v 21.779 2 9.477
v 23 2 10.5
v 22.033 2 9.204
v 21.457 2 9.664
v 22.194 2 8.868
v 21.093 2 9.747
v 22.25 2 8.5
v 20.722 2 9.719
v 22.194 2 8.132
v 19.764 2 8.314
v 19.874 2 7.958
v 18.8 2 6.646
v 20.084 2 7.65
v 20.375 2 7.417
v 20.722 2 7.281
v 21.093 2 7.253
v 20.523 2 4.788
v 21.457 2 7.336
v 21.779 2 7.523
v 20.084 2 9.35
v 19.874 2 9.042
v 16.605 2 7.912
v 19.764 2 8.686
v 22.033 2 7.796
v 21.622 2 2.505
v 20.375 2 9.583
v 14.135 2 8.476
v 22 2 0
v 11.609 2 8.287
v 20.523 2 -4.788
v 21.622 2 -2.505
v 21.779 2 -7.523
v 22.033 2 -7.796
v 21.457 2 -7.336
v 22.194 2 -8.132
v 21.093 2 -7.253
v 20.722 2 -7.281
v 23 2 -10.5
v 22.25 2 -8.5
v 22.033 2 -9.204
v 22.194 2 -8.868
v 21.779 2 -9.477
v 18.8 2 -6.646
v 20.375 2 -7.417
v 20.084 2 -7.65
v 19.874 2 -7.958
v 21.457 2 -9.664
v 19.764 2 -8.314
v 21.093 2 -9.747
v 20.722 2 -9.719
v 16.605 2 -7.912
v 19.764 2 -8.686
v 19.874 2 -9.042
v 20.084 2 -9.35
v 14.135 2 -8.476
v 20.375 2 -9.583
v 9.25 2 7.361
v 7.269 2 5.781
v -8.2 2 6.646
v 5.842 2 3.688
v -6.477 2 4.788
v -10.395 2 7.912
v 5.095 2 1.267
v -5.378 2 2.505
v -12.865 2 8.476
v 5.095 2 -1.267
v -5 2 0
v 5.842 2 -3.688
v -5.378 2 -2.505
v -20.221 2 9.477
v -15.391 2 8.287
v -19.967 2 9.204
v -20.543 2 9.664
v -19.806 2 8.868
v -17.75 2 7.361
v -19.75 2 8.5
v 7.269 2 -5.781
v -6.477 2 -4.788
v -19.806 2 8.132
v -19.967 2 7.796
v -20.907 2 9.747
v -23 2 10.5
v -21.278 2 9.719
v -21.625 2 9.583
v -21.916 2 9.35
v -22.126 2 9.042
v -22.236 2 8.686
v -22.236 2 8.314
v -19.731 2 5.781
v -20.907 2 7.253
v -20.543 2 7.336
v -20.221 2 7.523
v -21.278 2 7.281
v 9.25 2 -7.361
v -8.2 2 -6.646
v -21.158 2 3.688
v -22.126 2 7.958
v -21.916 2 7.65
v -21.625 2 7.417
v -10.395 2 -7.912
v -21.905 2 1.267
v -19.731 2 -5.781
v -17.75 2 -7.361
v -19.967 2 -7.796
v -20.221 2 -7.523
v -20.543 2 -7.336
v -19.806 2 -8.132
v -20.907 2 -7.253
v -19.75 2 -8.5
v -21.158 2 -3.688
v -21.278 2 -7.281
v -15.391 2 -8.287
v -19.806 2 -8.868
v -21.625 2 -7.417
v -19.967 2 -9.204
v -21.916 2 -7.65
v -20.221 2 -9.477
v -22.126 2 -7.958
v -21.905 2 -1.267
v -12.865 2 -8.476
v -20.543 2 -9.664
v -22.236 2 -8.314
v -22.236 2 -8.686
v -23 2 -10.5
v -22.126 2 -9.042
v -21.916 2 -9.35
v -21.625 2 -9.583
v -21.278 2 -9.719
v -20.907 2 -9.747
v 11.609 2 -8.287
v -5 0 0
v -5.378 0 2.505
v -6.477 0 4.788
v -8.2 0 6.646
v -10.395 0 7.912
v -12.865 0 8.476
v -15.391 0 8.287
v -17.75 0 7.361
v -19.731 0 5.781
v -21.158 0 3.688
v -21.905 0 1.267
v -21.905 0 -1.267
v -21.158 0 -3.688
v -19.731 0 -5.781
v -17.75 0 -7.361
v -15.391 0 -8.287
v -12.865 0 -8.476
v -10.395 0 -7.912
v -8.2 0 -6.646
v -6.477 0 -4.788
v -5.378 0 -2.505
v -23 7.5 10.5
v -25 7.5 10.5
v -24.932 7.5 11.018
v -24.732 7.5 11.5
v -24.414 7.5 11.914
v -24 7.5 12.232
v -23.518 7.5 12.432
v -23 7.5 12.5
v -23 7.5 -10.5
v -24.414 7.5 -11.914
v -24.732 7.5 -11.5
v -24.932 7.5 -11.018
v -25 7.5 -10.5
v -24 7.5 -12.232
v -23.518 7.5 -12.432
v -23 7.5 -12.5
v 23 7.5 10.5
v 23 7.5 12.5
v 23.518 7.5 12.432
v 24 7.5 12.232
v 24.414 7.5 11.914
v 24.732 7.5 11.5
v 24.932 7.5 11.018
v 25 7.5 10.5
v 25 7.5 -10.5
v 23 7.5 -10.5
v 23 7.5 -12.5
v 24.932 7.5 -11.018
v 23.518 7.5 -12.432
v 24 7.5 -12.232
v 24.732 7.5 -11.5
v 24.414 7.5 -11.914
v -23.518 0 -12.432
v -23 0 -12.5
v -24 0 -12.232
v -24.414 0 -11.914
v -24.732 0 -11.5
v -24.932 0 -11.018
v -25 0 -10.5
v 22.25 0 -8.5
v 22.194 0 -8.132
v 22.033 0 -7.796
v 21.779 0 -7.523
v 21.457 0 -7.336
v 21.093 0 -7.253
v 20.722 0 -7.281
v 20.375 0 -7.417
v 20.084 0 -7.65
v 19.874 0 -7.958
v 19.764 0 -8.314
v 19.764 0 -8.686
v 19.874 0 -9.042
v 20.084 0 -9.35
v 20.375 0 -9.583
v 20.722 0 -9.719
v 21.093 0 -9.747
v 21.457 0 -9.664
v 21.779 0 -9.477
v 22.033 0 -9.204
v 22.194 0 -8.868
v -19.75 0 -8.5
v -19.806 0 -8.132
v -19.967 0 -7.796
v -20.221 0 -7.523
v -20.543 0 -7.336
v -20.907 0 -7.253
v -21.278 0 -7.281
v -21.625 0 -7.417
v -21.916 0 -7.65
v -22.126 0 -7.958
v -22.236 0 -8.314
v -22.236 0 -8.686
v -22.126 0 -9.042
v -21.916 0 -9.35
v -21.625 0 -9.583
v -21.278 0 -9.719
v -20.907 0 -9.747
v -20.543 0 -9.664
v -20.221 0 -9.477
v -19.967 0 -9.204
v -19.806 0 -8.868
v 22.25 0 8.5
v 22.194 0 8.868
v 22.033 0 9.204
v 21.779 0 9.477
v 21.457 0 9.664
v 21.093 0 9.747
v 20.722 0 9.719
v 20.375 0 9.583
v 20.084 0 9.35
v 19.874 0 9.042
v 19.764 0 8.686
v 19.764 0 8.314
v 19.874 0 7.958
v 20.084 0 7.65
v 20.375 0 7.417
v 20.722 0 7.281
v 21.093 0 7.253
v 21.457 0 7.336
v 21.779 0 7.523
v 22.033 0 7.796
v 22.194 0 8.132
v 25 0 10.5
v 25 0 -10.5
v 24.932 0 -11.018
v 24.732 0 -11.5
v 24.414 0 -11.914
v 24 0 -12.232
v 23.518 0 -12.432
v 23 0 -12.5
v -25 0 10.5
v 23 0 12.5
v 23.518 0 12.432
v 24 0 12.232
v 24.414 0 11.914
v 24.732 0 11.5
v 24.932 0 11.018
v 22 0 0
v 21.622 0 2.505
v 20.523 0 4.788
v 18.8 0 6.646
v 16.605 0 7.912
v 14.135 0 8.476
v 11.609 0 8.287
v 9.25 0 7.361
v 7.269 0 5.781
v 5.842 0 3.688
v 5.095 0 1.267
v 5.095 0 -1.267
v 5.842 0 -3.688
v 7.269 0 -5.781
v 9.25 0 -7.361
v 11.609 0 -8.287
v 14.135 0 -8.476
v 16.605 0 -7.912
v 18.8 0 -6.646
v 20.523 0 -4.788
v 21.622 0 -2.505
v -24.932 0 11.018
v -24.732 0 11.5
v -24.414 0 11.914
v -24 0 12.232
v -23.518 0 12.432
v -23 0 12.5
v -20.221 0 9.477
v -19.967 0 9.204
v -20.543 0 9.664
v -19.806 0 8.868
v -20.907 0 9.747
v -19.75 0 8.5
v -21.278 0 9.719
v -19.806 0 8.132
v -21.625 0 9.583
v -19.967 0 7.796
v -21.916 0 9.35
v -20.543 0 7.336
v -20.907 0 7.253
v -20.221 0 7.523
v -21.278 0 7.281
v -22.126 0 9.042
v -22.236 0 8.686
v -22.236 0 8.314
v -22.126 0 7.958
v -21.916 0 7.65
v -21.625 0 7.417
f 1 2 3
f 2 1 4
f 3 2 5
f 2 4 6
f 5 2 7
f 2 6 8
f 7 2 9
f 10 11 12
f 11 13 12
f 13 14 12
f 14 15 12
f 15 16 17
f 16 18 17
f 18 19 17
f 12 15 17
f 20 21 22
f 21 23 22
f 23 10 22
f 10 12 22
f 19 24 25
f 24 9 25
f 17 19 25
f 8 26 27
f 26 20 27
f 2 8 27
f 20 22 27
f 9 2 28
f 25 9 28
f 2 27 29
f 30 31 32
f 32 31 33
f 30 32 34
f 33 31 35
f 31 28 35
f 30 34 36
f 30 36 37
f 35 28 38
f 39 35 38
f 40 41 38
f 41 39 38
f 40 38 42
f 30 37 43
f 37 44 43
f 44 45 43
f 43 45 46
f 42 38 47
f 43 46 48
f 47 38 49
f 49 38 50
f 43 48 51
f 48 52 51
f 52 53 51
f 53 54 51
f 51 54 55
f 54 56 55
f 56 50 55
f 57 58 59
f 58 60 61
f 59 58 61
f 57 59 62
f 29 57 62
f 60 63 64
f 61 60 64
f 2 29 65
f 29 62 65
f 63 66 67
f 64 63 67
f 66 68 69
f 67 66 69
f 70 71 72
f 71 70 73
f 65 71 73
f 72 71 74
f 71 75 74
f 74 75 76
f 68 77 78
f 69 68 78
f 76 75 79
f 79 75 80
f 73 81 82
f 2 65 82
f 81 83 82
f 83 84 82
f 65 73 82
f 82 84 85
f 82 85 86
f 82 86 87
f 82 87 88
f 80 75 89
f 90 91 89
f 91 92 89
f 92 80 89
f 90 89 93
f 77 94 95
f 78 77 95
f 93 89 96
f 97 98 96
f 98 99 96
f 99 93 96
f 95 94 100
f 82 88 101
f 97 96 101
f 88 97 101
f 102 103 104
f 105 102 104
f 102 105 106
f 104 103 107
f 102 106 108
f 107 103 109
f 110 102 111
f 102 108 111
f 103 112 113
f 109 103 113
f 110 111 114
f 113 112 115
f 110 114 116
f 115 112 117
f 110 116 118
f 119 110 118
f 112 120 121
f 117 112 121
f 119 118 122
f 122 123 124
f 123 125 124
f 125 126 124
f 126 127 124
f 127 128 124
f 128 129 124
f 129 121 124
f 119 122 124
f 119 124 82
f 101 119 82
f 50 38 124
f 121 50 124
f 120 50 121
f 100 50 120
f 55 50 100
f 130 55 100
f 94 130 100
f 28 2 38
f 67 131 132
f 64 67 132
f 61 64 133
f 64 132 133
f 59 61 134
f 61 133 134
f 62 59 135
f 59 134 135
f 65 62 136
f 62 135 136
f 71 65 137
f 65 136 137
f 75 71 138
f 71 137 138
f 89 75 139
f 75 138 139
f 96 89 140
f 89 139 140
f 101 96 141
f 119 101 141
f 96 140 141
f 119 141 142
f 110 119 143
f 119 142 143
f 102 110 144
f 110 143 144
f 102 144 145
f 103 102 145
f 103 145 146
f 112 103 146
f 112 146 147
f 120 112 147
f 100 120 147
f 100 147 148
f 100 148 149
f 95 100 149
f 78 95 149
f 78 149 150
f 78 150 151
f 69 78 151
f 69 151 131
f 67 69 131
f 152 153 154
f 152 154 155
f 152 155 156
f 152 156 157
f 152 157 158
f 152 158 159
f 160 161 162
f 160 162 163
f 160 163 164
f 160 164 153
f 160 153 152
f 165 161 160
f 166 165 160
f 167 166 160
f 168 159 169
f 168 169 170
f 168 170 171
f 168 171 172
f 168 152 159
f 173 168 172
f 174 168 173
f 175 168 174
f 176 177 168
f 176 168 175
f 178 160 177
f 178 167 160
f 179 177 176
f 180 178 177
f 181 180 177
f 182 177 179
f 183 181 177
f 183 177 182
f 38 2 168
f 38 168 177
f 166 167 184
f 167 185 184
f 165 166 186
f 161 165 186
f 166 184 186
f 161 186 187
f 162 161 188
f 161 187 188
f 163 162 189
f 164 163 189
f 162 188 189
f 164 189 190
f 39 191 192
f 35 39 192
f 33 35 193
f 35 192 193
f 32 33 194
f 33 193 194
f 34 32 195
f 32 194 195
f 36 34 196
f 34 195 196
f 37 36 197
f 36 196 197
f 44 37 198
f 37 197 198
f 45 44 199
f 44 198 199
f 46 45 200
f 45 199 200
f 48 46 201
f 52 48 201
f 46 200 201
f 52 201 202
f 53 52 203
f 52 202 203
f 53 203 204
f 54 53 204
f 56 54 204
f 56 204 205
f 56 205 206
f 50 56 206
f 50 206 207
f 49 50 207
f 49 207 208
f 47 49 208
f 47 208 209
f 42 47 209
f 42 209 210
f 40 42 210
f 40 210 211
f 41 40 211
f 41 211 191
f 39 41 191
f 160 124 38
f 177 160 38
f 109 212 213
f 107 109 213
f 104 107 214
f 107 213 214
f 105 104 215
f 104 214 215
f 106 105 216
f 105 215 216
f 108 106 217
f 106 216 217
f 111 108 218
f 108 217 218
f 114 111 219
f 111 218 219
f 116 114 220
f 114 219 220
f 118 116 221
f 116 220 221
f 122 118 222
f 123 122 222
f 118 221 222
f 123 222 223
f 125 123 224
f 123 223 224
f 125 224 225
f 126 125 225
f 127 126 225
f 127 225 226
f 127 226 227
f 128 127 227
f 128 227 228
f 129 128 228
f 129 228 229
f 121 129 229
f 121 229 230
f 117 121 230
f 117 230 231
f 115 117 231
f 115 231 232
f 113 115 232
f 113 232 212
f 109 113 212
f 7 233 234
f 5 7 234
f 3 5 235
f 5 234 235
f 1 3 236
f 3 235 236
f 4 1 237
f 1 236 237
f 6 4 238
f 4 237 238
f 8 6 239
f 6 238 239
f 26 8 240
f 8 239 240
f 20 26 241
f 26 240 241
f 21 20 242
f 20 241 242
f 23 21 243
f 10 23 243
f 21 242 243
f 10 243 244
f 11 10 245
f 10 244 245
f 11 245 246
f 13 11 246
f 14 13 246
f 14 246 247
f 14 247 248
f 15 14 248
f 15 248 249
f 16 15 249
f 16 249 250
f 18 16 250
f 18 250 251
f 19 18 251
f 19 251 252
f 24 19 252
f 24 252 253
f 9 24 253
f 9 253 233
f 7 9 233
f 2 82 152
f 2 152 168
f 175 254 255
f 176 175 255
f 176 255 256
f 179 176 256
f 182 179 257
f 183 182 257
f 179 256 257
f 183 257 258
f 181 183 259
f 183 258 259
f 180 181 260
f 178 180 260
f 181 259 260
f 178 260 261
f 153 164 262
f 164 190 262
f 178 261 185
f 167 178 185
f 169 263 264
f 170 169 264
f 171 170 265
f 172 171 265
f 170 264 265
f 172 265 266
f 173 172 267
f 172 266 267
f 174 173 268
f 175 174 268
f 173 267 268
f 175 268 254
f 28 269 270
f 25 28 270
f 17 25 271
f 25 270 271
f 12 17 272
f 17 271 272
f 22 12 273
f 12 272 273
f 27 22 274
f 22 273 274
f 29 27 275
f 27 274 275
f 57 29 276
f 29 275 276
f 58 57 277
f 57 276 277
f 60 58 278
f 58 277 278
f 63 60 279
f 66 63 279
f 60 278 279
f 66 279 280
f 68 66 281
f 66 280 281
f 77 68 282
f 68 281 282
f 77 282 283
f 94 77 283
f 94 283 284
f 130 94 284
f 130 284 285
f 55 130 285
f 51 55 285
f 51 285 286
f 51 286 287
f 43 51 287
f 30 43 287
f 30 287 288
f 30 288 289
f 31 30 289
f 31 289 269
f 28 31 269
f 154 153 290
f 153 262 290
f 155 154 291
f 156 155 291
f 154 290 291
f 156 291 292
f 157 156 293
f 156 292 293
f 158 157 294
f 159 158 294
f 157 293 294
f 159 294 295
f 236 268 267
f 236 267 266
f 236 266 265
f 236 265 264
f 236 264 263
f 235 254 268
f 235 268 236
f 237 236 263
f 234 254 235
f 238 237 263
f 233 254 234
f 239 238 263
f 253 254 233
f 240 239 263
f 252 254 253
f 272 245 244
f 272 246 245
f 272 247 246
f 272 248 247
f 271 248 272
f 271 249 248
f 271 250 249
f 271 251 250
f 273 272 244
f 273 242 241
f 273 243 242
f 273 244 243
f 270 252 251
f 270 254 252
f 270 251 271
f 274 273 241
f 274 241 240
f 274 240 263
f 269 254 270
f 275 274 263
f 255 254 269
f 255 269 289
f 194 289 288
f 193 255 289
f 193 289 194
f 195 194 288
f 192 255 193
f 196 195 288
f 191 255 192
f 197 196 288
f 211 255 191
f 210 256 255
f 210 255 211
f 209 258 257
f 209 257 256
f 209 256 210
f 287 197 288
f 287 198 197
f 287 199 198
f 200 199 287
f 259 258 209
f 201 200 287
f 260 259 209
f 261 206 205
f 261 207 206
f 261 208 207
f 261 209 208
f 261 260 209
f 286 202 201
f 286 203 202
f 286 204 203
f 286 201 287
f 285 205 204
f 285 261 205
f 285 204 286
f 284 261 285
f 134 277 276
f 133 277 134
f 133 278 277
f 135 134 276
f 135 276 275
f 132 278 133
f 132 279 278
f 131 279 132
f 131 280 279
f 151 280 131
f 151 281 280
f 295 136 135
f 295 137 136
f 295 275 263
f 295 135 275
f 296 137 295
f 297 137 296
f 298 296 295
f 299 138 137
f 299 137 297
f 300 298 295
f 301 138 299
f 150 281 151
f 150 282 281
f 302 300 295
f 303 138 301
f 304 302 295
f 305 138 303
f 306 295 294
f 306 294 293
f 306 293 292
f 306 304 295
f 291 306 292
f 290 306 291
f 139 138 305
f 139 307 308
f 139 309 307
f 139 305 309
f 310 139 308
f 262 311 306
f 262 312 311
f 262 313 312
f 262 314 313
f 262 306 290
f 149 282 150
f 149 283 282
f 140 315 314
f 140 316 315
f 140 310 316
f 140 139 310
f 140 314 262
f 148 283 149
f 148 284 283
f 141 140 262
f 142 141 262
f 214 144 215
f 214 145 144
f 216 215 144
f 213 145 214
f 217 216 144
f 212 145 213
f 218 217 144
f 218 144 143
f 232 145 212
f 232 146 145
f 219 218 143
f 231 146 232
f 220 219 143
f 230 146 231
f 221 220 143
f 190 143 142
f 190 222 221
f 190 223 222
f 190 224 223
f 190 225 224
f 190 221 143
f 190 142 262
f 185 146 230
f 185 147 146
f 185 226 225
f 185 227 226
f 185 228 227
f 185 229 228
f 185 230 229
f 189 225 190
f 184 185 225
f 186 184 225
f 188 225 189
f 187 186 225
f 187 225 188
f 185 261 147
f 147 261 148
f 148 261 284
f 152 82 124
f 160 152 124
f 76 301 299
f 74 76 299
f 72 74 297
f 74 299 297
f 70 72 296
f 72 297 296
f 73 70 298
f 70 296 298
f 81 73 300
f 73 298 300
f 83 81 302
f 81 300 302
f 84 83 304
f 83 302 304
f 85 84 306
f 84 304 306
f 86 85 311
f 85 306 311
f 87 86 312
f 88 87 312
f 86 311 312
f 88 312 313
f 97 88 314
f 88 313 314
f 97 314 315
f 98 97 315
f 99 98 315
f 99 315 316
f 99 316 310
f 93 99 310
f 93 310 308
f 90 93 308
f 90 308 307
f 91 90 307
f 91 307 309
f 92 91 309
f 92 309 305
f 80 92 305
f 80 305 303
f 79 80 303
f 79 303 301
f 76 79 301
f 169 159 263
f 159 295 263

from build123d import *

# Parameters (mm, degrees)
EXTRUDE_1_DEPTH     = 2
SKETCH_2_W          = 46
SKETCH_2_H          = 21
EXTRUDE_2_DEPTH     = 5.5
SKETCH_3_R          = 1.25
CUT_EXTRUDE_1_DEPTH = 8.5
SKETCH_4_R          = 8.5
CUT_EXTRUDE_2_DEPTH = 8.5


with BuildPart() as part:
    # 草图1 → 凸台-拉伸1 (new body)
    with BuildSketch(Plane(origin=(0, 0, 0), x_dir=(1, 0, 0), z_dir=(0, 1, 0))):
        with BuildLine():
            Line((-23, 12.5), (23, 12.5))
            ThreePointArc((23, 12.5), (24.414213562, 11.914213562), (25, 10.5))
            Line((25, 10.5), (25, -10.5))
            ThreePointArc((25, -10.5), (24.414213562, -11.914213562), (23, -12.5))
            Line((23, -12.5), (-23, -12.5))
            ThreePointArc((-23, -12.5), (-24.414213562, -11.914213562), (-25, -10.5))
            Line((-25, -10.5), (-25, 10.5))
            ThreePointArc((-25, 10.5), (-24.414213562, 11.914213562), (-23, 12.5))
        make_face()
    extrude(amount=EXTRUDE_1_DEPTH)

    # 草图2 → 凸台-拉伸2 (add)
    with BuildSketch(Plane(origin=(0, 2, 0), x_dir=(1, 0, 0), z_dir=(0, 1, 0))):
        with BuildLine():
            Line((23, 12.5), (-23, 12.5))
            ThreePointArc((-23, 12.5), (-24.414213562, 11.914213562), (-25, 10.5))
            Line((-25, 10.5), (-25, -10.5))
            ThreePointArc((-25, -10.5), (-24.414213562, -11.914213562), (-23, -12.5))
            Line((-23, -12.5), (23, -12.5))
            ThreePointArc((23, -12.5), (24.414213562, -11.914213562), (25, -10.5))
            Line((25, -10.5), (25, 10.5))
            ThreePointArc((25, 10.5), (24.414213562, 11.914213562), (23, 12.5))
        make_face()
        Rectangle(SKETCH_2_W, SKETCH_2_H, mode=Mode.SUBTRACT)
    extrude(amount=EXTRUDE_2_DEPTH)

    # 草图3 → 切除-拉伸1 (cut, through all)
    with BuildSketch(Plane.XZ):
        with Locations((-21, 8.5)):
            Circle(SKETCH_3_R)
        with Locations((-21, -8.5)):
            Circle(SKETCH_3_R)
        with Locations((21, 8.5)):
            Circle(SKETCH_3_R)
        with Locations((21, -8.5)):
            Circle(SKETCH_3_R)
    extrude(amount=-CUT_EXTRUDE_1_DEPTH, mode=Mode.SUBTRACT)

    # 草图4 → 切除-拉伸2 (cut, through all)
    with BuildSketch(Plane.XZ):
        with Locations((-13.5, 0)):
            Circle(SKETCH_4_R)
        with Locations((13.5, 0)):
            Circle(SKETCH_4_R)
    extrude(amount=-CUT_EXTRUDE_2_DEPTH, mode=Mode.SUBTRACT)


solid = part.part
